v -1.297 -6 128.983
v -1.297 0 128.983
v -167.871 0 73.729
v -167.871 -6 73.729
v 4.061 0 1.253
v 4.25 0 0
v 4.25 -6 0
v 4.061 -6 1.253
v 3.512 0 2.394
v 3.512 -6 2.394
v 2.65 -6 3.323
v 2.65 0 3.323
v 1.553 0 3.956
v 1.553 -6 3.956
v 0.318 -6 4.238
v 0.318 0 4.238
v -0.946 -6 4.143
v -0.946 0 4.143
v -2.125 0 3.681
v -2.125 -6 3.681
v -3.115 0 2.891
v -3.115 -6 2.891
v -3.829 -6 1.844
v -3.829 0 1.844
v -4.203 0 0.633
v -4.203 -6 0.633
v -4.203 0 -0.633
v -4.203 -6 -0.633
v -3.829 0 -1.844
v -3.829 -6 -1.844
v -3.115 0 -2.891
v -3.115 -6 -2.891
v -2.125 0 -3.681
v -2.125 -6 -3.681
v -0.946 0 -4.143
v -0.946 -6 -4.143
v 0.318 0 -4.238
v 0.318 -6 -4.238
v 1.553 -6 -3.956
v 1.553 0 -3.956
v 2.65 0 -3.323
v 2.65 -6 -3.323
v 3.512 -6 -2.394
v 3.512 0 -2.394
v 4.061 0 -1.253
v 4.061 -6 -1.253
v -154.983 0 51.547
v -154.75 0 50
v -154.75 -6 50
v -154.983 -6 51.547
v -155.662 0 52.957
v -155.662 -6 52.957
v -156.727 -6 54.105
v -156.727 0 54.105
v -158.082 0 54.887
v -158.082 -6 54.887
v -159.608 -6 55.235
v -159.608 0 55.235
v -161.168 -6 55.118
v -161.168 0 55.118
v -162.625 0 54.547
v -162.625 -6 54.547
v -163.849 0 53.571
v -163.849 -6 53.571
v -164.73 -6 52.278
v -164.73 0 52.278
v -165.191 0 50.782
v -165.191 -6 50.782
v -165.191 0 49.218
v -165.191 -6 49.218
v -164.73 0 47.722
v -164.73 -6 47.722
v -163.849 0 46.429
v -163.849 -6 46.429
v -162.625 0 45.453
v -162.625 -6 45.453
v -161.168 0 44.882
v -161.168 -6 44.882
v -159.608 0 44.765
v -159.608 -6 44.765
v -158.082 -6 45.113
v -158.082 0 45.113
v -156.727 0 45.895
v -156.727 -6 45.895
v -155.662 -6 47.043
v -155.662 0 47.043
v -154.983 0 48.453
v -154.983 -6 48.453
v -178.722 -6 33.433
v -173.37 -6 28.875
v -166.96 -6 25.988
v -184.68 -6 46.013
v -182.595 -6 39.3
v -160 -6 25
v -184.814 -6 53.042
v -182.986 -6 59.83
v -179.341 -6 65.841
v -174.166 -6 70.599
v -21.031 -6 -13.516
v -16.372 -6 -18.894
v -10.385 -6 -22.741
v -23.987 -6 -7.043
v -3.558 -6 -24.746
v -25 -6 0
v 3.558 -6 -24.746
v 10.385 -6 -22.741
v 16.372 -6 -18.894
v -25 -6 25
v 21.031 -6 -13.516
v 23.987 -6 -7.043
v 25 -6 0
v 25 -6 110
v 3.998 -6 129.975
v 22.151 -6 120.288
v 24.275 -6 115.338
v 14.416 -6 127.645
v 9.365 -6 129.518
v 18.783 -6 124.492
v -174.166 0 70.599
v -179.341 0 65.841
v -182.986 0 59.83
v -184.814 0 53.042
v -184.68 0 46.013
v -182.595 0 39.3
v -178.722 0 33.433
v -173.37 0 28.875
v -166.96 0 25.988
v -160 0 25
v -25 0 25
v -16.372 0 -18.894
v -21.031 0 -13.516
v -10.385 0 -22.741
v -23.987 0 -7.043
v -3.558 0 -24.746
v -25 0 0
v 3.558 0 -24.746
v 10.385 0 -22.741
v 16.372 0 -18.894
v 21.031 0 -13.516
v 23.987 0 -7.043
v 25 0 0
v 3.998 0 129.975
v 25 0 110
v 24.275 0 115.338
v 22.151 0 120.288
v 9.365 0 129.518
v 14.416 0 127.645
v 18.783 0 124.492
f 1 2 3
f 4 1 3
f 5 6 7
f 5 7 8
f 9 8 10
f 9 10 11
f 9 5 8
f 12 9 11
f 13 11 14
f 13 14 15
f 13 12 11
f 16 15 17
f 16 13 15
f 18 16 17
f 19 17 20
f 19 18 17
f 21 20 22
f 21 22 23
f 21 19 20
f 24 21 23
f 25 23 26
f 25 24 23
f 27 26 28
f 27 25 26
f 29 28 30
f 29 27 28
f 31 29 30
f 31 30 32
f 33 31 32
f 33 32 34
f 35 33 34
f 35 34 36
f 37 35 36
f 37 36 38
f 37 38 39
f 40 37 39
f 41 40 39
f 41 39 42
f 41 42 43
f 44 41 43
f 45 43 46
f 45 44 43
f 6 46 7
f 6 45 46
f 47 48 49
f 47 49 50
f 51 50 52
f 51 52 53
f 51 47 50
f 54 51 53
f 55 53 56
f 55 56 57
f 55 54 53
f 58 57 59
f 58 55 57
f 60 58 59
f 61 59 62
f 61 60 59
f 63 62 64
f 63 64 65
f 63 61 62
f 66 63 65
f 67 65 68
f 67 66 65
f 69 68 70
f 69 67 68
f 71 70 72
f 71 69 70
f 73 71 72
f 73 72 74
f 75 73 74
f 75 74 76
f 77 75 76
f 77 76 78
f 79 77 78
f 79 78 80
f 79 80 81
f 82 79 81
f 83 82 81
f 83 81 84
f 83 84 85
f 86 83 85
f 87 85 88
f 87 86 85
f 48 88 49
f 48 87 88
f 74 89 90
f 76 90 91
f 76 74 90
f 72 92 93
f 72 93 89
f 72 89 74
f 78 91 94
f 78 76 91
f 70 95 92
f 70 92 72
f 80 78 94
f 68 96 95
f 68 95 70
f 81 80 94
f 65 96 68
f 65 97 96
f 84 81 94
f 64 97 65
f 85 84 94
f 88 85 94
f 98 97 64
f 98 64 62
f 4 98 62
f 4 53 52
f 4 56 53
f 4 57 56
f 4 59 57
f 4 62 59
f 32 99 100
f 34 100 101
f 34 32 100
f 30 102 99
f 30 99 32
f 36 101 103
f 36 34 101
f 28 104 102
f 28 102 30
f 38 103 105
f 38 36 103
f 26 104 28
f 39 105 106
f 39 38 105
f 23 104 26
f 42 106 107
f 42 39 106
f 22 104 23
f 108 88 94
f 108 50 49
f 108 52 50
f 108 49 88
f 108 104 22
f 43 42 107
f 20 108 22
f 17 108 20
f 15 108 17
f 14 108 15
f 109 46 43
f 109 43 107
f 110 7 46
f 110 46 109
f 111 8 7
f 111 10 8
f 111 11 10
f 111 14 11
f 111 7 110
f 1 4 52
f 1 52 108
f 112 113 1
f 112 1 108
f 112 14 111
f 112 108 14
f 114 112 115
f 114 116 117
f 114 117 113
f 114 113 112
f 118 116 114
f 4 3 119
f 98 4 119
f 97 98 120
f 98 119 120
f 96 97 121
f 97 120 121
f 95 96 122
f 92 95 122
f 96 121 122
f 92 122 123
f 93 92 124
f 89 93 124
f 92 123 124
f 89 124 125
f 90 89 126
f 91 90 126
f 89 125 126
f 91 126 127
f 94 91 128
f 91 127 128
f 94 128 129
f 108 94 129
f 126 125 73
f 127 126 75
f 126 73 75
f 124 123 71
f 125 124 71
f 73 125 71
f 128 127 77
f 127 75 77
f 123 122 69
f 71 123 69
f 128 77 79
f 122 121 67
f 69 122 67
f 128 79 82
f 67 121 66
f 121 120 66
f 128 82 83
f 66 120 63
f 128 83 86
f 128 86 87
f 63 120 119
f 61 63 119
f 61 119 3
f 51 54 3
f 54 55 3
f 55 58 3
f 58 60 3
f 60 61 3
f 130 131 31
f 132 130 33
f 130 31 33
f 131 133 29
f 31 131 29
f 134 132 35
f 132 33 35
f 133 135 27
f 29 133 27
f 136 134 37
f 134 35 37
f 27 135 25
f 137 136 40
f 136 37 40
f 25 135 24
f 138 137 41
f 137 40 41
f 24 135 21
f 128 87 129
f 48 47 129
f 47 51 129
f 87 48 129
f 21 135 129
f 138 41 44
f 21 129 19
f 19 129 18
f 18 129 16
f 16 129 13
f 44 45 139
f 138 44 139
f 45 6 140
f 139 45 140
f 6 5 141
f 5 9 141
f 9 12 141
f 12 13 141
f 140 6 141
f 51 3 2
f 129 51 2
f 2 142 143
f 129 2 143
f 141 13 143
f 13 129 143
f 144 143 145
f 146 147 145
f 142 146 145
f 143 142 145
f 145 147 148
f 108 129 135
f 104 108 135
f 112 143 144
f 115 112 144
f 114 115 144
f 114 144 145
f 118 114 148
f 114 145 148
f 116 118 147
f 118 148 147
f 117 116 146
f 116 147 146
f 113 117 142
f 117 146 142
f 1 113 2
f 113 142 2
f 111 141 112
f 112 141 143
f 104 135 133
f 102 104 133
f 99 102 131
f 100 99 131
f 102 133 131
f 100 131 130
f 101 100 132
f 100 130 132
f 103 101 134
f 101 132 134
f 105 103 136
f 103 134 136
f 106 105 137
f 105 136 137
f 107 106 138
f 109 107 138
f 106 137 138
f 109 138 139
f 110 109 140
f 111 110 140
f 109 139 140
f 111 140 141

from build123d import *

# Parameters (mm, degrees)
F0_R     = 5.25
F0_R_2   = 4.25
F1_DEPTH = 6


with BuildPart() as f1:
    # F0 (on Front) → F1 (new body)
    with BuildSketch(Plane.XZ):
        with BuildLine():
            Line((-25, 25), (-25, 0))
            ThreePointArc((-25, 0), (0, -25), (25, 0))
            Line((25, 0), (25, 110))
            ThreePointArc((25, 110), (16.706063, 126.216291), (-1.296809, 128.982892))
            Line((-1.296809, 128.982892), (-167.871012, 73.728615))
            ThreePointArc((-167.871012, 73.728615), (-184.680107, 46.013484), (-160, 25))
            Line((-160, 25), (-25, 25))
        make_face()
        with Locations((-160, 50)):
            Circle(F0_R, mode=Mode.SUBTRACT)
        Circle(F0_R_2, mode=Mode.SUBTRACT)
    extrude(amount=F1_DEPTH)


solid = f1.part
